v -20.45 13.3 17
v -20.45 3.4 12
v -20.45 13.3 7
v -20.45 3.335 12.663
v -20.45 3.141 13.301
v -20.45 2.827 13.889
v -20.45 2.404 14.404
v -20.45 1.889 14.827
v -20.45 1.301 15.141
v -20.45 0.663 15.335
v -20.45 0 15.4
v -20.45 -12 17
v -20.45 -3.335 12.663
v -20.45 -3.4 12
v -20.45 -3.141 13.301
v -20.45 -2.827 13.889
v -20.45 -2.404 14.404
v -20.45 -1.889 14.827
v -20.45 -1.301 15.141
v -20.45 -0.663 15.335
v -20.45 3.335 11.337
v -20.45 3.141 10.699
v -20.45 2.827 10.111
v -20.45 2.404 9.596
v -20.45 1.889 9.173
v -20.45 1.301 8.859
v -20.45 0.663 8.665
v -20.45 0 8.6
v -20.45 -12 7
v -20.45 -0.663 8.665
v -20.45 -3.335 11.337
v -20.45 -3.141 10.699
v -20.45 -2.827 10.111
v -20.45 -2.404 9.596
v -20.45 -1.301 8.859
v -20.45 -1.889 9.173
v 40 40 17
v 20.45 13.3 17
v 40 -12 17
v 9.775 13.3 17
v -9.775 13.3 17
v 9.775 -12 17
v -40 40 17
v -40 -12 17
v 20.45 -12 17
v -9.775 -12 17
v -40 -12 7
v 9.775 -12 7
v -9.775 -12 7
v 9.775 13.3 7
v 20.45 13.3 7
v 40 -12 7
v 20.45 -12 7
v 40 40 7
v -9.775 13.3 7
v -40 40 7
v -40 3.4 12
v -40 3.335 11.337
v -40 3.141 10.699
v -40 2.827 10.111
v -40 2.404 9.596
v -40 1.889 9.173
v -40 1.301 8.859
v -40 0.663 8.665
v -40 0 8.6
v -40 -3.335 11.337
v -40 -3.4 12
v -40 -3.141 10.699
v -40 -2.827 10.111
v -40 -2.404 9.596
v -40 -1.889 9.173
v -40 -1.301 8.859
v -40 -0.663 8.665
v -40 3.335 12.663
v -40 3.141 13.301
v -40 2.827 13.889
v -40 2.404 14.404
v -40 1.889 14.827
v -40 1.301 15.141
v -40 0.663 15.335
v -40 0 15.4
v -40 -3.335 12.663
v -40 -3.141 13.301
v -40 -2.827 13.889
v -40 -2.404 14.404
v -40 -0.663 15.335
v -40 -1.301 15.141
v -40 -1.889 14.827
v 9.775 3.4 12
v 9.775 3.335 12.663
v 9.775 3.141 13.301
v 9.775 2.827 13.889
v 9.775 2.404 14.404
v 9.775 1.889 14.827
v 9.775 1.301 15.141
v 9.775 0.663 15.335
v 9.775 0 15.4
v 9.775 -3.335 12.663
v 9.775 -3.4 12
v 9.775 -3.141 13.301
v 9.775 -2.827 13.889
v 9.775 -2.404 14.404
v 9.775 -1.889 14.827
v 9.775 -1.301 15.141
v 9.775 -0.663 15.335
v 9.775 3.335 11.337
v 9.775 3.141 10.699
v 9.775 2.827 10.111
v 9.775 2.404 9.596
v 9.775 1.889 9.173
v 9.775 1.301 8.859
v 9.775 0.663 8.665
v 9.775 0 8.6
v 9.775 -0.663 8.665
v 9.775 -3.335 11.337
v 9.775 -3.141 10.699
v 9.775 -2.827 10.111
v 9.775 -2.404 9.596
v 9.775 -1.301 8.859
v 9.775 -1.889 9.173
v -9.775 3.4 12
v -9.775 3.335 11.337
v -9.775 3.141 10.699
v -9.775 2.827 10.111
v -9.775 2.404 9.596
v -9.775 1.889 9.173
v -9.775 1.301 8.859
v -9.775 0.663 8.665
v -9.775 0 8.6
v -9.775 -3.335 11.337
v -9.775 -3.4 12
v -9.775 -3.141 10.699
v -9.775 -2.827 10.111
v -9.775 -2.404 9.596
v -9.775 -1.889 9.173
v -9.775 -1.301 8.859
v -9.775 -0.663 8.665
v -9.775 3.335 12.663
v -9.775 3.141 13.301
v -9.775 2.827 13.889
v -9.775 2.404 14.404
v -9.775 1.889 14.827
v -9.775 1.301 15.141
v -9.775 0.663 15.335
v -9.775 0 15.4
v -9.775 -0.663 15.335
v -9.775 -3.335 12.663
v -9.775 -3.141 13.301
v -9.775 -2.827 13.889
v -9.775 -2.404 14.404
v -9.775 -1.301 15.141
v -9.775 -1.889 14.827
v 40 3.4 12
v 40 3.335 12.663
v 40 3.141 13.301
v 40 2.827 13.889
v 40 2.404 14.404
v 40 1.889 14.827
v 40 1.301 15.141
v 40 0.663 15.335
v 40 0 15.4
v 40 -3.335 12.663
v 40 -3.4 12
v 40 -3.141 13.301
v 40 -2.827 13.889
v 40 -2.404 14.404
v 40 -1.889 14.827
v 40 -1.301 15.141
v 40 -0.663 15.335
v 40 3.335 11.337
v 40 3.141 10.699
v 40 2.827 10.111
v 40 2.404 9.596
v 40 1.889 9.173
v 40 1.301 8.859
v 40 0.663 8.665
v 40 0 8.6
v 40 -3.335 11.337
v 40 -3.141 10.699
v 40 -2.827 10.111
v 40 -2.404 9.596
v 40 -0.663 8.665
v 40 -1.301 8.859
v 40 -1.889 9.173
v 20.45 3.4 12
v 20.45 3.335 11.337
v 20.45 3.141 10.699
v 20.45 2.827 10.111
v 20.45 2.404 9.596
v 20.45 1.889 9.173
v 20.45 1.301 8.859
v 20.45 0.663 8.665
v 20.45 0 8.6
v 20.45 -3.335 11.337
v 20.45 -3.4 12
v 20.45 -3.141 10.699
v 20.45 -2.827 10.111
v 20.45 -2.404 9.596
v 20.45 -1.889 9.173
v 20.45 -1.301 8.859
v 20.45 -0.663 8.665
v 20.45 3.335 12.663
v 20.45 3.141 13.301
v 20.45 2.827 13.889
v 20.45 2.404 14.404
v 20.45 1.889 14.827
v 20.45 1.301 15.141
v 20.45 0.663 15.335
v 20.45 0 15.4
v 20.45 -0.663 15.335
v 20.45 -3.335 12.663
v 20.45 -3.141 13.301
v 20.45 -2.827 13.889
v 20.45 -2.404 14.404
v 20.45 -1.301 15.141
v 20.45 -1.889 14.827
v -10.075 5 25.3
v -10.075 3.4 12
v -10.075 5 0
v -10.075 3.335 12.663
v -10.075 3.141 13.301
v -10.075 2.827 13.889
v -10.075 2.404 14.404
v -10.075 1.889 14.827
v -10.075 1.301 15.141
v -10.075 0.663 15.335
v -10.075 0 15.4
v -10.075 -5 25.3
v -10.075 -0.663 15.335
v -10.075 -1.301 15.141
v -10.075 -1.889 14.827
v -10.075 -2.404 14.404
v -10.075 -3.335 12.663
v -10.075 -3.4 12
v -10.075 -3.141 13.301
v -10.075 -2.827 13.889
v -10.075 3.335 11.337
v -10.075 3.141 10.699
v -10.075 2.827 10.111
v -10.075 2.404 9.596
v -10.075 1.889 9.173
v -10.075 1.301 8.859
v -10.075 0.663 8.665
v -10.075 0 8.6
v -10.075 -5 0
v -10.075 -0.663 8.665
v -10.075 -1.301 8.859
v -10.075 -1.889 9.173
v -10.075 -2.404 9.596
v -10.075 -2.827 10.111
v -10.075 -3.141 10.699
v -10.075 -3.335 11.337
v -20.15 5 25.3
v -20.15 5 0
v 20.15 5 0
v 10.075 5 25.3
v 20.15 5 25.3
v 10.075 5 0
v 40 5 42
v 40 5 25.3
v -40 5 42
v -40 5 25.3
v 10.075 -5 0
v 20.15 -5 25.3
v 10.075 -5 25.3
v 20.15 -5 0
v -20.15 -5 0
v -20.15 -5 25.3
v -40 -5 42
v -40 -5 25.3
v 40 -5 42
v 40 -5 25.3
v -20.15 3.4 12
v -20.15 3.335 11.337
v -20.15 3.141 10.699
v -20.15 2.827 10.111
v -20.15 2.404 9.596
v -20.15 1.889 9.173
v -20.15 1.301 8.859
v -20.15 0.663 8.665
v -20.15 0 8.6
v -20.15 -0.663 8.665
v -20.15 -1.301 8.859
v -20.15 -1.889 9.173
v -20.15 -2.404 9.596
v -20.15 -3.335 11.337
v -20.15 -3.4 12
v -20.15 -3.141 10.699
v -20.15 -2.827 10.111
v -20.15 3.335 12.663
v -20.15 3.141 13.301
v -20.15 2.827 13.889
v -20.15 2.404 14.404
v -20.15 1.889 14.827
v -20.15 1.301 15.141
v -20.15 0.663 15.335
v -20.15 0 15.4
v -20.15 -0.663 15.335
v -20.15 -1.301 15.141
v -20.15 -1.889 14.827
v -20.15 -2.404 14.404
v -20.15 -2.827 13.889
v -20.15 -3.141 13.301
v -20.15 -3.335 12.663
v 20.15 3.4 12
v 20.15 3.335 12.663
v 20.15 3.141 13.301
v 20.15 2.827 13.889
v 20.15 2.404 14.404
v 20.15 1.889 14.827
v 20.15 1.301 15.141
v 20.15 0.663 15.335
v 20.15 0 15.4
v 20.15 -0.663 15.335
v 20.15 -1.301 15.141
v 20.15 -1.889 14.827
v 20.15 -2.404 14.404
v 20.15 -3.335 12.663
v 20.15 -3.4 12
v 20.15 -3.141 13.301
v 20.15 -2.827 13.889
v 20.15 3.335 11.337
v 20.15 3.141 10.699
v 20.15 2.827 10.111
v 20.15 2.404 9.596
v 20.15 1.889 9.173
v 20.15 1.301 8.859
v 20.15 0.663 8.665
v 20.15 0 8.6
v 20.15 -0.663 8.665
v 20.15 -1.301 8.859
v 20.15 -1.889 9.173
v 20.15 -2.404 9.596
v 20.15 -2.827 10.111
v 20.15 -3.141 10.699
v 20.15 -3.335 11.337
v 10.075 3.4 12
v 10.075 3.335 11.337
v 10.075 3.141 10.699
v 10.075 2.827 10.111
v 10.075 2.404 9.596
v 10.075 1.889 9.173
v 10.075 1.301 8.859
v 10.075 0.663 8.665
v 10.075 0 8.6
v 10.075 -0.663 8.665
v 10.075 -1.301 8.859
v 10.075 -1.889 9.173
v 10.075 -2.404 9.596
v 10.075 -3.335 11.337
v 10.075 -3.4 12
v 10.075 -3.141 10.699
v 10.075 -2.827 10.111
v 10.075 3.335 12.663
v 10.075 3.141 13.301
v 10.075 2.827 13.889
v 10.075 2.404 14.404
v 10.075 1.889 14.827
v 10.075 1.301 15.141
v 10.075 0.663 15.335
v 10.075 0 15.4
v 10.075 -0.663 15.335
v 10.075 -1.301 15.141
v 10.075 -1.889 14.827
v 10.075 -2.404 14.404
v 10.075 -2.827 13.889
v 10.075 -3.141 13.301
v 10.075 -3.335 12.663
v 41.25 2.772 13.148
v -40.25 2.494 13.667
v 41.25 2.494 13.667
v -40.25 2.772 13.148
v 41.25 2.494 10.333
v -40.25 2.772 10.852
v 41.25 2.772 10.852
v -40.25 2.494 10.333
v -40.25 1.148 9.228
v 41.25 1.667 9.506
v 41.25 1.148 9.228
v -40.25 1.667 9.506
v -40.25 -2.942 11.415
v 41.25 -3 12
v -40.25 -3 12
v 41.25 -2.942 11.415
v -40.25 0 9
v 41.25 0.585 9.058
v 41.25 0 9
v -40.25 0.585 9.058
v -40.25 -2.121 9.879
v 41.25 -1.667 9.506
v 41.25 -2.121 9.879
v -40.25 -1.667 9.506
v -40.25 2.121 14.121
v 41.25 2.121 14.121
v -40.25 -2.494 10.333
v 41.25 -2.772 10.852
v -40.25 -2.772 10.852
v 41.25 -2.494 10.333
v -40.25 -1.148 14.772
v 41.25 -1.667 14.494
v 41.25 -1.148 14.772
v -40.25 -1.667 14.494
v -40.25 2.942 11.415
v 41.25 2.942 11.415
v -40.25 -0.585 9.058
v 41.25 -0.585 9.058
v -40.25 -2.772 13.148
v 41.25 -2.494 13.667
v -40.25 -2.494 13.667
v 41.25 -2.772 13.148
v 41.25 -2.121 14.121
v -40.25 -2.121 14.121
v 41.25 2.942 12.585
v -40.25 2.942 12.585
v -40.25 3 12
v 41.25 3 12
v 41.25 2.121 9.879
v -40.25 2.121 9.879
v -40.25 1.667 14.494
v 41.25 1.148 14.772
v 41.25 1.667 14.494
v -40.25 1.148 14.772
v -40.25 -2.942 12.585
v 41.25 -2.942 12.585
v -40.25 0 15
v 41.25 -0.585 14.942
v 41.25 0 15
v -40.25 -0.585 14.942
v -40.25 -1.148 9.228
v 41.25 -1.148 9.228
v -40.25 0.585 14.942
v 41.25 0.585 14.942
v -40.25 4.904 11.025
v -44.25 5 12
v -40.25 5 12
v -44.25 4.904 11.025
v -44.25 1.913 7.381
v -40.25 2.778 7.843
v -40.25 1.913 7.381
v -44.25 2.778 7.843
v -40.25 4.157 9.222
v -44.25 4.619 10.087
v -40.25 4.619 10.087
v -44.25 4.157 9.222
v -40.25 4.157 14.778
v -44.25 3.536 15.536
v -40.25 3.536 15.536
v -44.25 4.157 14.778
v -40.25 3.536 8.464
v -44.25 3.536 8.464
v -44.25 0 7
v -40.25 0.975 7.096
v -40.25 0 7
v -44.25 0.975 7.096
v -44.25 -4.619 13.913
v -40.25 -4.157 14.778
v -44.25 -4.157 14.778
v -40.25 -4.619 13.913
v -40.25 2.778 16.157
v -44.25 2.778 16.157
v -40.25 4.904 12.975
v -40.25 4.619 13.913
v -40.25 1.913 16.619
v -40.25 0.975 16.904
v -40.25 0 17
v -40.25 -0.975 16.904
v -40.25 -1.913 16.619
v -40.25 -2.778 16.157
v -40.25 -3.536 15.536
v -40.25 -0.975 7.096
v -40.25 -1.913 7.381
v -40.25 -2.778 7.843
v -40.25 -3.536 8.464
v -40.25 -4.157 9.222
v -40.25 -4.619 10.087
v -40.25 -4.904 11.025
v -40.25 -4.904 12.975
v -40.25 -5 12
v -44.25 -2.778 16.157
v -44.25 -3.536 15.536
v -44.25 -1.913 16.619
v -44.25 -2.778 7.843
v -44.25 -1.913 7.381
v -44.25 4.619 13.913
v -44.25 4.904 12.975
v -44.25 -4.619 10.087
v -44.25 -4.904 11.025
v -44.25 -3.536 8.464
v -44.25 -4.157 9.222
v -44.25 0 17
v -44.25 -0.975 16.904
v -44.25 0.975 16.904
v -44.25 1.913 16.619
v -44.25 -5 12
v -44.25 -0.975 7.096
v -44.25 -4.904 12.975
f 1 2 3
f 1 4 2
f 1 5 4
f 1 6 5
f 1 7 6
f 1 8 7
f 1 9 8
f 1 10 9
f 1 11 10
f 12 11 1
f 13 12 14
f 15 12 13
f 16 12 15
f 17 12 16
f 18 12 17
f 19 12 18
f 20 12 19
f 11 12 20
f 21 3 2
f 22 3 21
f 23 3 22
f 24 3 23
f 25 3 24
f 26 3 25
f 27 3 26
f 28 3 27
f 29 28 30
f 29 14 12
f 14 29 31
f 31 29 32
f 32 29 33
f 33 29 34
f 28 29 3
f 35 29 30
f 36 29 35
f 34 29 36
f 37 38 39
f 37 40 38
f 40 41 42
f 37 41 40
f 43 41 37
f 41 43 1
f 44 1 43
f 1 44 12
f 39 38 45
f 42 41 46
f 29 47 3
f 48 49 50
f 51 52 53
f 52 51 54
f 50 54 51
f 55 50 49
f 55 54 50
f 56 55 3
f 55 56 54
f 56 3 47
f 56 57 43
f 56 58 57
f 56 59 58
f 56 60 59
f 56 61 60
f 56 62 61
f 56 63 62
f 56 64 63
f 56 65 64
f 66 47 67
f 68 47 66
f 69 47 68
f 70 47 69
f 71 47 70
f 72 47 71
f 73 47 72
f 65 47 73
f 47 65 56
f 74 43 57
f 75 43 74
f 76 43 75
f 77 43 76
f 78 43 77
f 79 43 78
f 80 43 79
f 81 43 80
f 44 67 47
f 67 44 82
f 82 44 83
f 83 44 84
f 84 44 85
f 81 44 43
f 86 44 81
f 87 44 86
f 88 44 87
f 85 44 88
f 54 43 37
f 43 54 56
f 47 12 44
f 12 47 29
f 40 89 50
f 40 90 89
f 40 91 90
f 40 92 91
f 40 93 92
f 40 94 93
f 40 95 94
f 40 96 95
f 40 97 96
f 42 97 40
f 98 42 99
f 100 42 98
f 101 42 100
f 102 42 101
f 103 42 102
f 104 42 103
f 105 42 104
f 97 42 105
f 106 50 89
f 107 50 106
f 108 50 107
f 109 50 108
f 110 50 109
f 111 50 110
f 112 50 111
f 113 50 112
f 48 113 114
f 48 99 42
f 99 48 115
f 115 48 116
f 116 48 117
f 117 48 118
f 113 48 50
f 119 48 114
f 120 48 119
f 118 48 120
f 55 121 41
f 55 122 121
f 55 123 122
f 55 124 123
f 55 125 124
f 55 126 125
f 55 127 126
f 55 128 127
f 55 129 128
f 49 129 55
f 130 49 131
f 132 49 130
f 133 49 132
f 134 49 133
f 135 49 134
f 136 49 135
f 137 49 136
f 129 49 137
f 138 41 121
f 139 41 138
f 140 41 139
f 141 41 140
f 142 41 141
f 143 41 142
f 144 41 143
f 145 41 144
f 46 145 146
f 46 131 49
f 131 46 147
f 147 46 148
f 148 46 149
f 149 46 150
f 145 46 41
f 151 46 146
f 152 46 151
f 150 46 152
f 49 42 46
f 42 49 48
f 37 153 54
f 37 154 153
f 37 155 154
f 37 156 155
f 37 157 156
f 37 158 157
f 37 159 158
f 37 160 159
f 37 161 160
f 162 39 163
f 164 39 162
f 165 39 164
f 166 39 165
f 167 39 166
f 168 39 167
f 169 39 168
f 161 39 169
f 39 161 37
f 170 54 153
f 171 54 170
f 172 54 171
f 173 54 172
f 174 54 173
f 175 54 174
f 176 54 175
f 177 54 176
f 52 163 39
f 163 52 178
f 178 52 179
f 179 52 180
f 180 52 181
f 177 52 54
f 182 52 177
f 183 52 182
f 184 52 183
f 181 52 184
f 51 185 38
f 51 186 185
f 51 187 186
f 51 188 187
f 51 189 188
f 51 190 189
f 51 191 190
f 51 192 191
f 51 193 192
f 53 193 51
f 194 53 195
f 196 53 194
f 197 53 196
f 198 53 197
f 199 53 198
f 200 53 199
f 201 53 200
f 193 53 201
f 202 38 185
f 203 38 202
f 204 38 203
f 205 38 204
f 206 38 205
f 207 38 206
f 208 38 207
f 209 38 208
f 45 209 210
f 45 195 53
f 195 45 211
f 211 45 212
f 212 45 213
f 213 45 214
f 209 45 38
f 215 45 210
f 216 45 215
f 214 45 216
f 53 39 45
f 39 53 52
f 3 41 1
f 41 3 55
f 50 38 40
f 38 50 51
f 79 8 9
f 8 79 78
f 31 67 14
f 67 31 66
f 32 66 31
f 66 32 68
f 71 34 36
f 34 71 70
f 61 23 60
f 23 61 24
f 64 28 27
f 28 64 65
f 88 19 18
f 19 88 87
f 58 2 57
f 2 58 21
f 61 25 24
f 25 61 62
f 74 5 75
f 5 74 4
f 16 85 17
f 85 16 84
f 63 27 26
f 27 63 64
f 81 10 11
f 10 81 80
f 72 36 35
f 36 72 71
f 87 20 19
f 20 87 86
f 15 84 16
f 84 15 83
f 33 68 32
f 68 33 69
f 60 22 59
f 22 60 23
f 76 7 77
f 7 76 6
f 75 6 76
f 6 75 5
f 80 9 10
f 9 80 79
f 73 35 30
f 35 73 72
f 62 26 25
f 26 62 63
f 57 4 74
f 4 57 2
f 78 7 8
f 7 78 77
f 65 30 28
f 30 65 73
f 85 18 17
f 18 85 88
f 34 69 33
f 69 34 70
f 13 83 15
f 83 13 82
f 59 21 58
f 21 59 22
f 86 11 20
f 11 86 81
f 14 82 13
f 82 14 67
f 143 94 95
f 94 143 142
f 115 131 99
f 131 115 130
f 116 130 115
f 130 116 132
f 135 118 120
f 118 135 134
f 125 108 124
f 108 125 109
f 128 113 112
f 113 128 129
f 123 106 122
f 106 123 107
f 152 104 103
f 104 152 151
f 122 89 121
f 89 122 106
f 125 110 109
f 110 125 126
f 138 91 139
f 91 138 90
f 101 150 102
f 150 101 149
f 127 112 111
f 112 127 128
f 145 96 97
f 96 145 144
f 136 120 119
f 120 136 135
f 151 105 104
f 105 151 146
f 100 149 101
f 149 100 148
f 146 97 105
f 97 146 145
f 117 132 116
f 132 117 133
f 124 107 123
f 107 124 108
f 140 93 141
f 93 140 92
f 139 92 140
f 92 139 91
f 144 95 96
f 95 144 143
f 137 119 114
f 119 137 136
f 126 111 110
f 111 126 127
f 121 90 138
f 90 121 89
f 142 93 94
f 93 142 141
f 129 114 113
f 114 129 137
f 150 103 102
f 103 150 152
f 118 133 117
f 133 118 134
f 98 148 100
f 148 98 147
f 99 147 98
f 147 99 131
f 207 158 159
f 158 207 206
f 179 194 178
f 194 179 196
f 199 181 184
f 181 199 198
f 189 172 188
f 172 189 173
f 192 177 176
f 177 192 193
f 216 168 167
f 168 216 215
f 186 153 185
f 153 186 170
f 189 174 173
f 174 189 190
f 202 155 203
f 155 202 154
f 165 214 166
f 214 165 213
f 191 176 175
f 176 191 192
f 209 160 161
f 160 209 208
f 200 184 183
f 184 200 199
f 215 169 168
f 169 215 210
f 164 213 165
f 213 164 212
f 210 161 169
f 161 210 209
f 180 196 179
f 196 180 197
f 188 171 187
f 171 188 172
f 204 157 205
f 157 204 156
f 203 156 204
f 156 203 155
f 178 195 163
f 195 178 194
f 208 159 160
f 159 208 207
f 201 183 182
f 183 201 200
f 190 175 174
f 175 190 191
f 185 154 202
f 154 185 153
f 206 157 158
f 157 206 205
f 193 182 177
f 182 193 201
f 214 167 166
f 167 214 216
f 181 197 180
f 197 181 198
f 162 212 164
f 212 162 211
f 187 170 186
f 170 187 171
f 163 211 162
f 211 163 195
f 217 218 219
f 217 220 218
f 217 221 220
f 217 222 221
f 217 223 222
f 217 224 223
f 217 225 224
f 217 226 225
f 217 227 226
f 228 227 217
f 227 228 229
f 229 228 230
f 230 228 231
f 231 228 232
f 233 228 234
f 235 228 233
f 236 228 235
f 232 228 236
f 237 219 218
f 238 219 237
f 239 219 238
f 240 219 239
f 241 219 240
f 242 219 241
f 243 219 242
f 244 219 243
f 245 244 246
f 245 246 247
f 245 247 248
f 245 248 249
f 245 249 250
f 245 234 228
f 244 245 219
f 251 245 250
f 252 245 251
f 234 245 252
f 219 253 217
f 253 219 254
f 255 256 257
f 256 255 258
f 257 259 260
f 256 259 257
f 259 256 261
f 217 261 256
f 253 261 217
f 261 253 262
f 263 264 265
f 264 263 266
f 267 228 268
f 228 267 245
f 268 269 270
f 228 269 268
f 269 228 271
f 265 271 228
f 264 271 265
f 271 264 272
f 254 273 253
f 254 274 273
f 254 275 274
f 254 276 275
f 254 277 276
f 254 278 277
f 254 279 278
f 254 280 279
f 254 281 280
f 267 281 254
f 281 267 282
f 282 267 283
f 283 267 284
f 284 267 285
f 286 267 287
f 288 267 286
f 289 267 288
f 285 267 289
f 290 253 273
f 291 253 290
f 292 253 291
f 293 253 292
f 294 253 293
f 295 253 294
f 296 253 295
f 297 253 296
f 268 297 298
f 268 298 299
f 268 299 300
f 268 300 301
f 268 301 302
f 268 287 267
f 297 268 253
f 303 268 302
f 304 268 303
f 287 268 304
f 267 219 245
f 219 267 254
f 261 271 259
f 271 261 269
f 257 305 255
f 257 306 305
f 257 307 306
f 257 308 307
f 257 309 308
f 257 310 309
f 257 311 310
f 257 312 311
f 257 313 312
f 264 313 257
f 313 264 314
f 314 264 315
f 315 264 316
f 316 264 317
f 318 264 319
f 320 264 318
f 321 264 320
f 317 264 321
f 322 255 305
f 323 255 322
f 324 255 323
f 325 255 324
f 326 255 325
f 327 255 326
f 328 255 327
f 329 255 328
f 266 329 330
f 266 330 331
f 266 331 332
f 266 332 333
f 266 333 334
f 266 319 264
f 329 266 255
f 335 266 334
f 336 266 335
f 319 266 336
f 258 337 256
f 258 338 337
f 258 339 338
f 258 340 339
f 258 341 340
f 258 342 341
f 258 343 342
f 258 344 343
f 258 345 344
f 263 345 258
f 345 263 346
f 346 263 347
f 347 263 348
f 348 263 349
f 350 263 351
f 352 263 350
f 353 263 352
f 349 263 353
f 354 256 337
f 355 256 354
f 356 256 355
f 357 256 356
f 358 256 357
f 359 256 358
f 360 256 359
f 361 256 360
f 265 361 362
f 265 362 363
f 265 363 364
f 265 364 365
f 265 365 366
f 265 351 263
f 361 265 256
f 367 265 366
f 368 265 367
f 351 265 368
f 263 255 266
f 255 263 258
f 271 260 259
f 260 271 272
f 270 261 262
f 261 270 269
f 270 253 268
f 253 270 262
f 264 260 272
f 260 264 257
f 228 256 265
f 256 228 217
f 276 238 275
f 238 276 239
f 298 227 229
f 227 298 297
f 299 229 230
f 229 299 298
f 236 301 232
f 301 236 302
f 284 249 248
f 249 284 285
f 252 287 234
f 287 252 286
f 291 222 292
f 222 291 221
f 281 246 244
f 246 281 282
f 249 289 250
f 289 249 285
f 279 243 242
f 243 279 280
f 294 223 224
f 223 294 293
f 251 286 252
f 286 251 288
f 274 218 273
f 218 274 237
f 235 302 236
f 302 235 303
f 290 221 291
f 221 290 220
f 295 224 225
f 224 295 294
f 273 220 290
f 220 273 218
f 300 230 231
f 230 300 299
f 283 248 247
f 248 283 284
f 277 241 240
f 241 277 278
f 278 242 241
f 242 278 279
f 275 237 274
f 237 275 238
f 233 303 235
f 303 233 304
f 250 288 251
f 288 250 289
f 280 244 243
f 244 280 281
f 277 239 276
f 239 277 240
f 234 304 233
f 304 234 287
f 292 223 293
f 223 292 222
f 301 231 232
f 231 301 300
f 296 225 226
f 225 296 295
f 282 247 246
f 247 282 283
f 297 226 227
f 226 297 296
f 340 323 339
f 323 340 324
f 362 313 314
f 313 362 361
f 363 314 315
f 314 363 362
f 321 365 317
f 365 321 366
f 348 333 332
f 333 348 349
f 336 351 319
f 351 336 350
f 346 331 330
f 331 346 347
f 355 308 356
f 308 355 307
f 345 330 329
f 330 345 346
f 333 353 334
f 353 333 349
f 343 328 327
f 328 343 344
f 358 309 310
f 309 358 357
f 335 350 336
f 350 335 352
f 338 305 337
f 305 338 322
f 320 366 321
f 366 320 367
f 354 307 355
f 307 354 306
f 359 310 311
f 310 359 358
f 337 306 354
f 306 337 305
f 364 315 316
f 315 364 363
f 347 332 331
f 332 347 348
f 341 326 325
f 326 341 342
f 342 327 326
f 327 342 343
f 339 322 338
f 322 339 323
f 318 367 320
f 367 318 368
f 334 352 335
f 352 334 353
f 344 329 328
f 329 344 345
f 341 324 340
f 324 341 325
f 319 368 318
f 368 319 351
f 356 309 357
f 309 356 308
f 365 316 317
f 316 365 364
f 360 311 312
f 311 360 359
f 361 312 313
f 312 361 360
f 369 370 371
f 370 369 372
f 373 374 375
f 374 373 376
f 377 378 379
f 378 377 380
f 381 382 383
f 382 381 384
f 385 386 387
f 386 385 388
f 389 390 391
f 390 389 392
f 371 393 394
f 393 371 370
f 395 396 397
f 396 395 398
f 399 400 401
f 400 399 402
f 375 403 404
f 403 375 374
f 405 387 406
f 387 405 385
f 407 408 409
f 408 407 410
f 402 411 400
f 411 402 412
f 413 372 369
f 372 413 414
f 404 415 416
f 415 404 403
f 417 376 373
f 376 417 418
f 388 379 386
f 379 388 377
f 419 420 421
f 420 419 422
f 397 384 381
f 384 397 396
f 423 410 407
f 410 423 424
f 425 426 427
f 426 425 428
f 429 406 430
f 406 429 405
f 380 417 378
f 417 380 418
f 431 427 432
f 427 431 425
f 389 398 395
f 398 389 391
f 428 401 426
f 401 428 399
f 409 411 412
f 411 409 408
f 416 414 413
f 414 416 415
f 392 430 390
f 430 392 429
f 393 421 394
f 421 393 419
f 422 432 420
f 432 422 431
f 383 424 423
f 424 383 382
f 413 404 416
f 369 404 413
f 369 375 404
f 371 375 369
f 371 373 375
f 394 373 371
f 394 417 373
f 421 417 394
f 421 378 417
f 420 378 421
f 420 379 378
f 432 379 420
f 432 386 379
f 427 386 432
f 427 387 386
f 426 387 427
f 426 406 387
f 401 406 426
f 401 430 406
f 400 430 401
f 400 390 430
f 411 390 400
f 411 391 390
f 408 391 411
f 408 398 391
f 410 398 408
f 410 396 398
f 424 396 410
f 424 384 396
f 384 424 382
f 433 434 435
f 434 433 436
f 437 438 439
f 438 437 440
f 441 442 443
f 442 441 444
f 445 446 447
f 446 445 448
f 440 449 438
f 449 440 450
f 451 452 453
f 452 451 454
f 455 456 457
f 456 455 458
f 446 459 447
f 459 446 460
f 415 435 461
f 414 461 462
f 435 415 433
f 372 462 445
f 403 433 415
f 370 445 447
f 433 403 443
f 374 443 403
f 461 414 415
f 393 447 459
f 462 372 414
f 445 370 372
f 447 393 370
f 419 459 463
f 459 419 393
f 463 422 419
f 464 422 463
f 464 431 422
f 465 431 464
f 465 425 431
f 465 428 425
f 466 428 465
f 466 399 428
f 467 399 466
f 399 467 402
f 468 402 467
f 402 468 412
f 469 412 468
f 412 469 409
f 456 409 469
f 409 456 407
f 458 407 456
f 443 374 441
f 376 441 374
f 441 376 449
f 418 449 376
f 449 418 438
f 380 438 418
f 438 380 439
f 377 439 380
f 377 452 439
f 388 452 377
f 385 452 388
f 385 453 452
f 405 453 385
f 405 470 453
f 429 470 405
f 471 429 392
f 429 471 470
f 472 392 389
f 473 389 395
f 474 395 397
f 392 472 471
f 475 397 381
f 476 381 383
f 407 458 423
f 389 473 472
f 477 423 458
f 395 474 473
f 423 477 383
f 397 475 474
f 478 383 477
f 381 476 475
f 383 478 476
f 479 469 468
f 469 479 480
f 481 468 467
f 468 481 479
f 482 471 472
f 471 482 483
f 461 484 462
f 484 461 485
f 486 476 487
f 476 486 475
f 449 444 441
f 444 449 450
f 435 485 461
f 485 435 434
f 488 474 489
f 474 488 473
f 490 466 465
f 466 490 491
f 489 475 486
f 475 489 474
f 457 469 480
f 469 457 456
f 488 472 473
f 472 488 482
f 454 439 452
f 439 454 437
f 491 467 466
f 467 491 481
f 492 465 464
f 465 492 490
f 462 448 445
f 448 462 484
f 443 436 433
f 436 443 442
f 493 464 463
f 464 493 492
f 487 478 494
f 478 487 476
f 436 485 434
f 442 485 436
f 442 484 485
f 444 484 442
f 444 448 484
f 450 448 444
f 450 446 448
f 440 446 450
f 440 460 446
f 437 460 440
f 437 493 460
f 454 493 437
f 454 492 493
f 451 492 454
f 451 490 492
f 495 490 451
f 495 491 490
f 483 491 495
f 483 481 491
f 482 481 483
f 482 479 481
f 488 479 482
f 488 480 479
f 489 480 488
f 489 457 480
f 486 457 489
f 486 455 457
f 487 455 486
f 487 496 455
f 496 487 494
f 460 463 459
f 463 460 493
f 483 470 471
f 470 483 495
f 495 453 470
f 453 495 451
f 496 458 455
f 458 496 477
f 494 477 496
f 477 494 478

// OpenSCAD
$fn = 32;

// ------------------------------------------------------------------------
// Butt hinge: hinge 80 mm, leaf swung 270 deg
// Every part is its own module, assembly() places every instance.
// ------------------------------------------------------------------------

// --- part 1 ---
module hinge_base() {
  difference() {
    union() {
      translate([-40, -12, -5]) cube([19.55, 52, 10]);
      translate([-9.775, -12, -5]) cube([19.55, 52, 10]);
      translate([20.45, -12, -5]) cube([19.55, 52, 10]);
      translate([-40, 13.3, -5]) cube([80, 26.7, 10]);
    }
    translate([-30.225, 0, 0]) rotate([0, 90, 0]) cylinder(h = 21.55, d = 6.8, center = true);
    translate([0, 0, 0]) rotate([0, 90, 0]) cylinder(h = 21.55, d = 6.8, center = true);
    translate([30.225, 0, 0]) rotate([0, 90, 0]) cylinder(h = 21.55, d = 6.8, center = true);
  }
}

// --- part 2 ---
module hinge_mover() {
  difference() {
    union() {
      translate([-20.15, -30, -5]) cube([10.075, 42, 10]);
      translate([10.075, -30, -5]) cube([10.075, 42, 10]);
      translate([-40, -30, -5]) cube([80, 16.7, 10]);
    }
    translate([-15.113, 0, 0]) rotate([0, 90, 0]) cylinder(h = 12.075, d = 6.8, center = true);
    translate([15.113, 0, 0]) rotate([0, 90, 0]) cylinder(h = 12.075, d = 6.8, center = true);
  }
}

// --- part 3 ---
module hinge_pin() {
  rotate([0, 90, 0]) cylinder(h = 82.5, d = 6, center = true);
  translate([-44.25, 0, 0]) rotate([0, 90, 0]) cylinder(h = 4, d = 10);
}

// --- assembly ---
module assembly() {
  color([0.80, 0.24, 0.20]) translate([0, 0, 12]) rotate([0, 0, 0]) hinge_base();
  color([0.20, 0.45, 0.75]) translate([0, 0, 12]) rotate([270, 0, 0]) hinge_mover();
  color([0.25, 0.62, 0.32]) translate([0, 0, 12]) rotate([0, 0, 0]) hinge_pin();
}

assembly();
